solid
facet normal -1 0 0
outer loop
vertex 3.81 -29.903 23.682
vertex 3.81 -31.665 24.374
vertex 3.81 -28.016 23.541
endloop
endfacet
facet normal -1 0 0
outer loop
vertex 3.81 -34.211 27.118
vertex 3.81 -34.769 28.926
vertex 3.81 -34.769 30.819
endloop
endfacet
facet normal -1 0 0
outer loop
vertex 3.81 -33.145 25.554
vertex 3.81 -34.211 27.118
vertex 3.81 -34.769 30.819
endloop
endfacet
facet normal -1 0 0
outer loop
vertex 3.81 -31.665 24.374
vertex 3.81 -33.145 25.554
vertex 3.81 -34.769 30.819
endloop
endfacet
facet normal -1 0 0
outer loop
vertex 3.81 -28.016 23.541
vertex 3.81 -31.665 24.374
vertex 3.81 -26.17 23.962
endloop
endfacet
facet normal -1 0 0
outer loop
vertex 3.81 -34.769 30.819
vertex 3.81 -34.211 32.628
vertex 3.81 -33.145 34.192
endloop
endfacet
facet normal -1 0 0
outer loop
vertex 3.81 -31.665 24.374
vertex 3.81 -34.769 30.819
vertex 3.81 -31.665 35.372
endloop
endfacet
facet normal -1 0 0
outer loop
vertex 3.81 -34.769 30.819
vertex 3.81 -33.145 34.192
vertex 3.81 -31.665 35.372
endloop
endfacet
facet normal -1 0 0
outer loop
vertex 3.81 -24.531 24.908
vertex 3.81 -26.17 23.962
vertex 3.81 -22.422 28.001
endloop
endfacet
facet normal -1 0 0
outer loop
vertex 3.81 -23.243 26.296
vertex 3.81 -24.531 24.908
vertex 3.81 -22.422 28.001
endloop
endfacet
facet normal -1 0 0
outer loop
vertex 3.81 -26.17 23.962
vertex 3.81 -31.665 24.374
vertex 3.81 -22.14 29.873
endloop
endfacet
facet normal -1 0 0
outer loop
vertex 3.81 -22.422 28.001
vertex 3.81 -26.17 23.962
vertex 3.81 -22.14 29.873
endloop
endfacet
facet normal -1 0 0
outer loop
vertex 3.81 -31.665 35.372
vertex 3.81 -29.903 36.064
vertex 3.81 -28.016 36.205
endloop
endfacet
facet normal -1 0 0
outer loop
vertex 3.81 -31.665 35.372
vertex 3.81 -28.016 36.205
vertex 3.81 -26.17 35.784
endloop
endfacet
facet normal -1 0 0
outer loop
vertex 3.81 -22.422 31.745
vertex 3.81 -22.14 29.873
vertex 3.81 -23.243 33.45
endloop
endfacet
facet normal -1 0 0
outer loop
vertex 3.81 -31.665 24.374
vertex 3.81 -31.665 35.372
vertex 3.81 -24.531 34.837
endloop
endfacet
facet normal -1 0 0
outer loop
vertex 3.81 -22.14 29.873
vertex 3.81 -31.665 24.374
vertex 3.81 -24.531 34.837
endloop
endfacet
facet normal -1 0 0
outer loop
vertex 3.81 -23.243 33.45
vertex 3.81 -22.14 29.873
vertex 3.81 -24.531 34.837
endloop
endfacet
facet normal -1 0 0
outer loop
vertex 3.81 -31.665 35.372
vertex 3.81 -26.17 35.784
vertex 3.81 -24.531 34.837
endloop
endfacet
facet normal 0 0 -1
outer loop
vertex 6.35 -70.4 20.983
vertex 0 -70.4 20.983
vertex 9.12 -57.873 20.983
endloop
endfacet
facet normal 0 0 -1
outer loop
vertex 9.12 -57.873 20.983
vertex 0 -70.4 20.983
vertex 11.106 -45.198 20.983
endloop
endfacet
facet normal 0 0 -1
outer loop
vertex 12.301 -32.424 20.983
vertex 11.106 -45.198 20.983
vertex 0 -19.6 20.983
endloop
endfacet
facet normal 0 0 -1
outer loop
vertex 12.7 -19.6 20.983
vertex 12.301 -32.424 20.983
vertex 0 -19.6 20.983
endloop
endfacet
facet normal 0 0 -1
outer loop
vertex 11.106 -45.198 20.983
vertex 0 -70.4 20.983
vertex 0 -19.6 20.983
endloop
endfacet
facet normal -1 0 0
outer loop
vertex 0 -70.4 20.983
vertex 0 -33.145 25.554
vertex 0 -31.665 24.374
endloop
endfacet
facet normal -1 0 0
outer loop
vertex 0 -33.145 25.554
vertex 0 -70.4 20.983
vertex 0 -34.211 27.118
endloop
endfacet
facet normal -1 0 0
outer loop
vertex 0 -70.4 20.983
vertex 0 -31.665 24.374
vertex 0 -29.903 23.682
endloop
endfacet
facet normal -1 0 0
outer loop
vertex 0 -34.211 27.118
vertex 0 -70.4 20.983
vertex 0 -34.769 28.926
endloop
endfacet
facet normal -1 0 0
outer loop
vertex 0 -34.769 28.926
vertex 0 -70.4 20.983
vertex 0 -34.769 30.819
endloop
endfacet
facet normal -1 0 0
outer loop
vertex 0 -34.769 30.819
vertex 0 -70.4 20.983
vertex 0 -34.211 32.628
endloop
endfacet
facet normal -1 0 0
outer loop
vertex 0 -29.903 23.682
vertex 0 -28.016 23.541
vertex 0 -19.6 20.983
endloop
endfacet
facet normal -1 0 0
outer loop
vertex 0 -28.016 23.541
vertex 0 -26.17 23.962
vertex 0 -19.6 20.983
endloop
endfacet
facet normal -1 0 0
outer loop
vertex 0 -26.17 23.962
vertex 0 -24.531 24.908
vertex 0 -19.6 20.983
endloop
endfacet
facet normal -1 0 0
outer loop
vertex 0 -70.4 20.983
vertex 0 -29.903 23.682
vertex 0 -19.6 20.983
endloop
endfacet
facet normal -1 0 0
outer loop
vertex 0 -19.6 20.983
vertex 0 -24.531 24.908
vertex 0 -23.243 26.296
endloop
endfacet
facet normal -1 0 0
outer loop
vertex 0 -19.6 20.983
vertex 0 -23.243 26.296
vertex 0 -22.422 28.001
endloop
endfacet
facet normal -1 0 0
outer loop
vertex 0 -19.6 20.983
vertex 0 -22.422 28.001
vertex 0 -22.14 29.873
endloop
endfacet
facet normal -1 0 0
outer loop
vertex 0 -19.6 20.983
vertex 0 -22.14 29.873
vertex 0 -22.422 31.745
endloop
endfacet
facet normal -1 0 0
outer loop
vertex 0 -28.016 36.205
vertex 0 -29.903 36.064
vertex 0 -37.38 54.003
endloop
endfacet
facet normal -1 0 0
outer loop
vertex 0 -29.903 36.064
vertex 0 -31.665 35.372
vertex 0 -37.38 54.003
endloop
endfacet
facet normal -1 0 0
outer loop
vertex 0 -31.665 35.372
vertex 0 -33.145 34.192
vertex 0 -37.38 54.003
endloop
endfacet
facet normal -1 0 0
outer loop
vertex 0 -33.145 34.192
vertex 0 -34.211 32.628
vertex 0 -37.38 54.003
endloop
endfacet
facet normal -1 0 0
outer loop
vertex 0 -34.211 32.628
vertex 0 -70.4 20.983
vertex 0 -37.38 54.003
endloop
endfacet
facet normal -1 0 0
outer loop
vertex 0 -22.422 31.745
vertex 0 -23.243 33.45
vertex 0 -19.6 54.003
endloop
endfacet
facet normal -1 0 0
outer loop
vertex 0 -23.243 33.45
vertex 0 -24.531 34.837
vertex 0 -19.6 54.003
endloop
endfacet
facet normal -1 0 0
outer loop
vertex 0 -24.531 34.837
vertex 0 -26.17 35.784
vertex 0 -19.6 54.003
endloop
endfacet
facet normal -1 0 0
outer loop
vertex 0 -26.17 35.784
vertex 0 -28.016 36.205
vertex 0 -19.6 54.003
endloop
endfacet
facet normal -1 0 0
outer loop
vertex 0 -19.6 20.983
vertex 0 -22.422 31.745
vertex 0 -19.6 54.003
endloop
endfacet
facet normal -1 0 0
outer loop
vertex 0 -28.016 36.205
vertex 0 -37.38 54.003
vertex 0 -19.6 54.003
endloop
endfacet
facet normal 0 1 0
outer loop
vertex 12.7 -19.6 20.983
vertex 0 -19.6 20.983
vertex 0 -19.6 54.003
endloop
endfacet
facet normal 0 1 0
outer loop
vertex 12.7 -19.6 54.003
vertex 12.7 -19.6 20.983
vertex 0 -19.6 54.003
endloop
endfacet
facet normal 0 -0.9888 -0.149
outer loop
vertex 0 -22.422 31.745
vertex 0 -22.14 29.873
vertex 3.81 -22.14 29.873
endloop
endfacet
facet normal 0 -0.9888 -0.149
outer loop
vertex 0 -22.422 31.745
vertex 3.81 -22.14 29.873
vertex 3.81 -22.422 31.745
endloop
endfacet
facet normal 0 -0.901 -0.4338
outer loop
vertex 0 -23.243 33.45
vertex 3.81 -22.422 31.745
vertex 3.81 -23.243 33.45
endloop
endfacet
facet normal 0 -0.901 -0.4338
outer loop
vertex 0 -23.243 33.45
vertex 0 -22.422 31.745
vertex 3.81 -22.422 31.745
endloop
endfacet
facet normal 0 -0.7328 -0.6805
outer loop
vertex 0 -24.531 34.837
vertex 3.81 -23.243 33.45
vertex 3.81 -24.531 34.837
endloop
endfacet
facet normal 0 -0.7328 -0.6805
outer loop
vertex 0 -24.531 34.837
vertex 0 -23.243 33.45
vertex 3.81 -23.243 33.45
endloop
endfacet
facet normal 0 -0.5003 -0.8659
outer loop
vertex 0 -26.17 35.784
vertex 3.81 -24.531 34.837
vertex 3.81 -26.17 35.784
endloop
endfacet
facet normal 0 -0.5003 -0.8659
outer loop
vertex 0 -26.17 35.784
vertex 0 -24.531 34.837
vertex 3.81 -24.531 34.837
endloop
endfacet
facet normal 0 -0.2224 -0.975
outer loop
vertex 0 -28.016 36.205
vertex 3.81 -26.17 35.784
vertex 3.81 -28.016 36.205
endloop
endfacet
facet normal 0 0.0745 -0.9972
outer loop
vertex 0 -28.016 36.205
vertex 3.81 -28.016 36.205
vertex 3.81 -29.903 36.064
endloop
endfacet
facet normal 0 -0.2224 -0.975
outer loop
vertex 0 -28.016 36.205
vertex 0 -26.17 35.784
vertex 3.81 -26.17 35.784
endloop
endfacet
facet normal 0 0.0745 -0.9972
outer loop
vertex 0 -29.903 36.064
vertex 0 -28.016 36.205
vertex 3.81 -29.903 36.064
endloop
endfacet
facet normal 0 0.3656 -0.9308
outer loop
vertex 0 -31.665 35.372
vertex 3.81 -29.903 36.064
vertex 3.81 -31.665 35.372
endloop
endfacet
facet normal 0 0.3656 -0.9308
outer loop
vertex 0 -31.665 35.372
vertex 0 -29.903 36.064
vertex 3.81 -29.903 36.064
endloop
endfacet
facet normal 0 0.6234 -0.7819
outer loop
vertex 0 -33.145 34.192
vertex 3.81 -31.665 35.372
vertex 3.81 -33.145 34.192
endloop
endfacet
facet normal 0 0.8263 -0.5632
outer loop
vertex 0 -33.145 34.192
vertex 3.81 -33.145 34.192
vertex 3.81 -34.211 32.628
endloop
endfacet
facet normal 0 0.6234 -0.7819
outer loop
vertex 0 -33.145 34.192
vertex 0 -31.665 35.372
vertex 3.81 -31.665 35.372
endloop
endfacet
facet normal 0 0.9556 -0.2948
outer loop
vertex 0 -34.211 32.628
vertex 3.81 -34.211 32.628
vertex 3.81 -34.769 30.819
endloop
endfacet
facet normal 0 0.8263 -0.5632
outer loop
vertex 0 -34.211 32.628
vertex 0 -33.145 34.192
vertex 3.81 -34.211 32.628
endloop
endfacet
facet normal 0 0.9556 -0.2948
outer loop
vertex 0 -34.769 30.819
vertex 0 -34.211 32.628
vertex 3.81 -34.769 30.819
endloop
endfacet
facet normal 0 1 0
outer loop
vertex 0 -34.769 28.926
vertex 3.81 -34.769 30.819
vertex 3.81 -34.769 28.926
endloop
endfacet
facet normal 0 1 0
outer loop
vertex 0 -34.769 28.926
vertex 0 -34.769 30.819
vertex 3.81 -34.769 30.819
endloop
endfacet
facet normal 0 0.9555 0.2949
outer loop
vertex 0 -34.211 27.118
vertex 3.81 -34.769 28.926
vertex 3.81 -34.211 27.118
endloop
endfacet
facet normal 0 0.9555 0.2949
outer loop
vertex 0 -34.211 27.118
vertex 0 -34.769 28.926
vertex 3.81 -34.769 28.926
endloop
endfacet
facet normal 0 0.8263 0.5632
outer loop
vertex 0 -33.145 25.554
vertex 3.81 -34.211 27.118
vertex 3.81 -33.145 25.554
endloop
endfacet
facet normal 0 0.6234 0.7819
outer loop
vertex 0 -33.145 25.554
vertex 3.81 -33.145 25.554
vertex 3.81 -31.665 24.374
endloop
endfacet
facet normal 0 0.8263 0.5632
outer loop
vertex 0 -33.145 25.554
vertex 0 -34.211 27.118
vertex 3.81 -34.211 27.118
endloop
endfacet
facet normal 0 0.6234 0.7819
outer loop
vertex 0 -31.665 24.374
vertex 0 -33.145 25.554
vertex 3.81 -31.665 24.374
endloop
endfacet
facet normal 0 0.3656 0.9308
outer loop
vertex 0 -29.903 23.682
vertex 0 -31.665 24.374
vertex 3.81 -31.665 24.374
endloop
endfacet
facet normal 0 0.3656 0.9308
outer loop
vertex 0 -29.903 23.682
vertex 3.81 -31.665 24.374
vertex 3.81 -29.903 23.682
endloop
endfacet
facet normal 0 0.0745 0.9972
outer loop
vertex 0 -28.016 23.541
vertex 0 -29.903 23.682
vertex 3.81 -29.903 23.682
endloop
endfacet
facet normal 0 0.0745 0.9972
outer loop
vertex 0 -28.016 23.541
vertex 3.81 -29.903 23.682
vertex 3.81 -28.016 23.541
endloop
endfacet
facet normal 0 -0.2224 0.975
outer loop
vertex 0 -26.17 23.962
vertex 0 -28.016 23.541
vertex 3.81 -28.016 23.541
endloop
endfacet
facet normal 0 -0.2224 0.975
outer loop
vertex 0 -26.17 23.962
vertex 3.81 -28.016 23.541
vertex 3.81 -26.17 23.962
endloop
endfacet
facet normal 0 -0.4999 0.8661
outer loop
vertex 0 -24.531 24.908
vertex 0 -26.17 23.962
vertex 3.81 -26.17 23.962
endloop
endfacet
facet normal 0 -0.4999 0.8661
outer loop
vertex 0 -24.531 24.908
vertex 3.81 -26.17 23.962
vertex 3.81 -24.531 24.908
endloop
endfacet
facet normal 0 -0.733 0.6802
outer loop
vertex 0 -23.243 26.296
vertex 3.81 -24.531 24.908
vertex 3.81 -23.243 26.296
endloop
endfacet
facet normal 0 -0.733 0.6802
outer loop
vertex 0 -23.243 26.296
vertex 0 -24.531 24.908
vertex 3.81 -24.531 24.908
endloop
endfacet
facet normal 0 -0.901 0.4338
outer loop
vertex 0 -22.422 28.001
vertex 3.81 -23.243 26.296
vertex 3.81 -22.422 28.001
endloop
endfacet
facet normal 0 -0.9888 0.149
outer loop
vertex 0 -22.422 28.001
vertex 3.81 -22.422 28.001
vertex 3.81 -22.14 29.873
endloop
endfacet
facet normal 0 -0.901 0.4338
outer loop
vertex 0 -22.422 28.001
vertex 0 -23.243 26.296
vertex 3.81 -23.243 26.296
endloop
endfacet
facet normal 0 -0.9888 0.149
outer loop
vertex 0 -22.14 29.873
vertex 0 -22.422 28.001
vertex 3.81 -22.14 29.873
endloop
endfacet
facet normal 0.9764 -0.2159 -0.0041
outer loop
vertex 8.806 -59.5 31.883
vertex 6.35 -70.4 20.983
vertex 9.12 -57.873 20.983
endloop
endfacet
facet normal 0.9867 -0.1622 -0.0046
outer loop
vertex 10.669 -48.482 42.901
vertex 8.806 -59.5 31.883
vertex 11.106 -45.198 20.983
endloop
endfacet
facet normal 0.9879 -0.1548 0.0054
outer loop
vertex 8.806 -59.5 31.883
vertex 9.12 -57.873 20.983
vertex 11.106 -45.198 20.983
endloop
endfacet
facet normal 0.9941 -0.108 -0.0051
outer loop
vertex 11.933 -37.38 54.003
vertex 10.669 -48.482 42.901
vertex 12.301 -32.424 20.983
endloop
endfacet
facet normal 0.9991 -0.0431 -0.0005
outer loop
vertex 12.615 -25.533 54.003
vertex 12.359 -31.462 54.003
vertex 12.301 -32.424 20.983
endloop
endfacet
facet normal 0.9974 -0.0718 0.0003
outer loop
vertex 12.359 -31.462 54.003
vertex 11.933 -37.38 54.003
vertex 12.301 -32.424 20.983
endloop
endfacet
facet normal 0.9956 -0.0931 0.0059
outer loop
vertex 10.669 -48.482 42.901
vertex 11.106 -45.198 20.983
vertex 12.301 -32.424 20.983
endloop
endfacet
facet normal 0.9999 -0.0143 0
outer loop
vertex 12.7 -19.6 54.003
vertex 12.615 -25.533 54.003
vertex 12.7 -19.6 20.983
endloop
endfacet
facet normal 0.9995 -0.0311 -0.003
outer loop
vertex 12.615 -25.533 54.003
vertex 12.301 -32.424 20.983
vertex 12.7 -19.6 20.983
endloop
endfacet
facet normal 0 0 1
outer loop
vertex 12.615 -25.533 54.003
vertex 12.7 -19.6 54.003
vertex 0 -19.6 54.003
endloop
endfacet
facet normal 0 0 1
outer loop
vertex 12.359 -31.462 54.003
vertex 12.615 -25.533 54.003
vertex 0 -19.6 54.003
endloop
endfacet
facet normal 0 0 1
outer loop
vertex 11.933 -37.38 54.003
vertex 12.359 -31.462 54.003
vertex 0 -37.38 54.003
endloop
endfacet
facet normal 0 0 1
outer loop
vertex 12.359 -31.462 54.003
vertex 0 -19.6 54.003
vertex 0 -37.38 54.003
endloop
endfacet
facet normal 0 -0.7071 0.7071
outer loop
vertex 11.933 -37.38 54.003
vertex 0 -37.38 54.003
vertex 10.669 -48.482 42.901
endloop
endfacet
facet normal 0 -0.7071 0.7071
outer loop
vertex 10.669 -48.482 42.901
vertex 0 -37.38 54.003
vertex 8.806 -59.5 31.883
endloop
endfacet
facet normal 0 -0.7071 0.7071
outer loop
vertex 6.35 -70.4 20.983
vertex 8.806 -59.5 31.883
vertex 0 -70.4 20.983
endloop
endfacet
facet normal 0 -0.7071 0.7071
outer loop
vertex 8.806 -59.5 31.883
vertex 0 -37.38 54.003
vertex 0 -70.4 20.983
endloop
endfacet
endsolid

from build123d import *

# Parameters (mm, degrees)
F0_R     = 6.35
F1_DEPTH = 12.7
F2_DEPTH = 3.81
F4_DEPTH = 50.8


with BuildPart() as f1:
    # F0 (on Right) → F1 (new body)
    with BuildSketch(Plane.YZ):
        Polygon((-37.380086, 54.002845), (-70.400086, 20.982845), (-19.600086, 20.982845), (-19.600086, 54.002845), align=None)
        with Locations((-28.490086, 29.872845)):
            Circle(F0_R, mode=Mode.SUBTRACT)
        with Locations((-28.490086, 29.872845)):
            Circle(F0_R)
    extrude(amount=F1_DEPTH)

    # F0 (on Right) → F2 (cut)
    with BuildSketch(Plane.YZ):
        with Locations((-28.490086, 29.872845)):
            Circle(F0_R)
    extrude(amount=F2_DEPTH, mode=Mode.SUBTRACT)

    # F3 (on face) → F4 (cut)
    with BuildSketch(Plane(origin=(0, 0, 20.982845), x_dir=(1, 0, 0), z_dir=(0, 0, -1))):
        with BuildLine():
            ThreePointArc((6.35, 70.400086), (11.106347, 45.197754), (12.7, 19.600086))
            Line((12.7, 19.600086), (12.7, 70.400086))
            Line((12.7, 70.400086), (6.35, 70.400086))
        make_face()
    extrude(amount=-F4_DEPTH, mode=Mode.SUBTRACT)


solid = f1.part
